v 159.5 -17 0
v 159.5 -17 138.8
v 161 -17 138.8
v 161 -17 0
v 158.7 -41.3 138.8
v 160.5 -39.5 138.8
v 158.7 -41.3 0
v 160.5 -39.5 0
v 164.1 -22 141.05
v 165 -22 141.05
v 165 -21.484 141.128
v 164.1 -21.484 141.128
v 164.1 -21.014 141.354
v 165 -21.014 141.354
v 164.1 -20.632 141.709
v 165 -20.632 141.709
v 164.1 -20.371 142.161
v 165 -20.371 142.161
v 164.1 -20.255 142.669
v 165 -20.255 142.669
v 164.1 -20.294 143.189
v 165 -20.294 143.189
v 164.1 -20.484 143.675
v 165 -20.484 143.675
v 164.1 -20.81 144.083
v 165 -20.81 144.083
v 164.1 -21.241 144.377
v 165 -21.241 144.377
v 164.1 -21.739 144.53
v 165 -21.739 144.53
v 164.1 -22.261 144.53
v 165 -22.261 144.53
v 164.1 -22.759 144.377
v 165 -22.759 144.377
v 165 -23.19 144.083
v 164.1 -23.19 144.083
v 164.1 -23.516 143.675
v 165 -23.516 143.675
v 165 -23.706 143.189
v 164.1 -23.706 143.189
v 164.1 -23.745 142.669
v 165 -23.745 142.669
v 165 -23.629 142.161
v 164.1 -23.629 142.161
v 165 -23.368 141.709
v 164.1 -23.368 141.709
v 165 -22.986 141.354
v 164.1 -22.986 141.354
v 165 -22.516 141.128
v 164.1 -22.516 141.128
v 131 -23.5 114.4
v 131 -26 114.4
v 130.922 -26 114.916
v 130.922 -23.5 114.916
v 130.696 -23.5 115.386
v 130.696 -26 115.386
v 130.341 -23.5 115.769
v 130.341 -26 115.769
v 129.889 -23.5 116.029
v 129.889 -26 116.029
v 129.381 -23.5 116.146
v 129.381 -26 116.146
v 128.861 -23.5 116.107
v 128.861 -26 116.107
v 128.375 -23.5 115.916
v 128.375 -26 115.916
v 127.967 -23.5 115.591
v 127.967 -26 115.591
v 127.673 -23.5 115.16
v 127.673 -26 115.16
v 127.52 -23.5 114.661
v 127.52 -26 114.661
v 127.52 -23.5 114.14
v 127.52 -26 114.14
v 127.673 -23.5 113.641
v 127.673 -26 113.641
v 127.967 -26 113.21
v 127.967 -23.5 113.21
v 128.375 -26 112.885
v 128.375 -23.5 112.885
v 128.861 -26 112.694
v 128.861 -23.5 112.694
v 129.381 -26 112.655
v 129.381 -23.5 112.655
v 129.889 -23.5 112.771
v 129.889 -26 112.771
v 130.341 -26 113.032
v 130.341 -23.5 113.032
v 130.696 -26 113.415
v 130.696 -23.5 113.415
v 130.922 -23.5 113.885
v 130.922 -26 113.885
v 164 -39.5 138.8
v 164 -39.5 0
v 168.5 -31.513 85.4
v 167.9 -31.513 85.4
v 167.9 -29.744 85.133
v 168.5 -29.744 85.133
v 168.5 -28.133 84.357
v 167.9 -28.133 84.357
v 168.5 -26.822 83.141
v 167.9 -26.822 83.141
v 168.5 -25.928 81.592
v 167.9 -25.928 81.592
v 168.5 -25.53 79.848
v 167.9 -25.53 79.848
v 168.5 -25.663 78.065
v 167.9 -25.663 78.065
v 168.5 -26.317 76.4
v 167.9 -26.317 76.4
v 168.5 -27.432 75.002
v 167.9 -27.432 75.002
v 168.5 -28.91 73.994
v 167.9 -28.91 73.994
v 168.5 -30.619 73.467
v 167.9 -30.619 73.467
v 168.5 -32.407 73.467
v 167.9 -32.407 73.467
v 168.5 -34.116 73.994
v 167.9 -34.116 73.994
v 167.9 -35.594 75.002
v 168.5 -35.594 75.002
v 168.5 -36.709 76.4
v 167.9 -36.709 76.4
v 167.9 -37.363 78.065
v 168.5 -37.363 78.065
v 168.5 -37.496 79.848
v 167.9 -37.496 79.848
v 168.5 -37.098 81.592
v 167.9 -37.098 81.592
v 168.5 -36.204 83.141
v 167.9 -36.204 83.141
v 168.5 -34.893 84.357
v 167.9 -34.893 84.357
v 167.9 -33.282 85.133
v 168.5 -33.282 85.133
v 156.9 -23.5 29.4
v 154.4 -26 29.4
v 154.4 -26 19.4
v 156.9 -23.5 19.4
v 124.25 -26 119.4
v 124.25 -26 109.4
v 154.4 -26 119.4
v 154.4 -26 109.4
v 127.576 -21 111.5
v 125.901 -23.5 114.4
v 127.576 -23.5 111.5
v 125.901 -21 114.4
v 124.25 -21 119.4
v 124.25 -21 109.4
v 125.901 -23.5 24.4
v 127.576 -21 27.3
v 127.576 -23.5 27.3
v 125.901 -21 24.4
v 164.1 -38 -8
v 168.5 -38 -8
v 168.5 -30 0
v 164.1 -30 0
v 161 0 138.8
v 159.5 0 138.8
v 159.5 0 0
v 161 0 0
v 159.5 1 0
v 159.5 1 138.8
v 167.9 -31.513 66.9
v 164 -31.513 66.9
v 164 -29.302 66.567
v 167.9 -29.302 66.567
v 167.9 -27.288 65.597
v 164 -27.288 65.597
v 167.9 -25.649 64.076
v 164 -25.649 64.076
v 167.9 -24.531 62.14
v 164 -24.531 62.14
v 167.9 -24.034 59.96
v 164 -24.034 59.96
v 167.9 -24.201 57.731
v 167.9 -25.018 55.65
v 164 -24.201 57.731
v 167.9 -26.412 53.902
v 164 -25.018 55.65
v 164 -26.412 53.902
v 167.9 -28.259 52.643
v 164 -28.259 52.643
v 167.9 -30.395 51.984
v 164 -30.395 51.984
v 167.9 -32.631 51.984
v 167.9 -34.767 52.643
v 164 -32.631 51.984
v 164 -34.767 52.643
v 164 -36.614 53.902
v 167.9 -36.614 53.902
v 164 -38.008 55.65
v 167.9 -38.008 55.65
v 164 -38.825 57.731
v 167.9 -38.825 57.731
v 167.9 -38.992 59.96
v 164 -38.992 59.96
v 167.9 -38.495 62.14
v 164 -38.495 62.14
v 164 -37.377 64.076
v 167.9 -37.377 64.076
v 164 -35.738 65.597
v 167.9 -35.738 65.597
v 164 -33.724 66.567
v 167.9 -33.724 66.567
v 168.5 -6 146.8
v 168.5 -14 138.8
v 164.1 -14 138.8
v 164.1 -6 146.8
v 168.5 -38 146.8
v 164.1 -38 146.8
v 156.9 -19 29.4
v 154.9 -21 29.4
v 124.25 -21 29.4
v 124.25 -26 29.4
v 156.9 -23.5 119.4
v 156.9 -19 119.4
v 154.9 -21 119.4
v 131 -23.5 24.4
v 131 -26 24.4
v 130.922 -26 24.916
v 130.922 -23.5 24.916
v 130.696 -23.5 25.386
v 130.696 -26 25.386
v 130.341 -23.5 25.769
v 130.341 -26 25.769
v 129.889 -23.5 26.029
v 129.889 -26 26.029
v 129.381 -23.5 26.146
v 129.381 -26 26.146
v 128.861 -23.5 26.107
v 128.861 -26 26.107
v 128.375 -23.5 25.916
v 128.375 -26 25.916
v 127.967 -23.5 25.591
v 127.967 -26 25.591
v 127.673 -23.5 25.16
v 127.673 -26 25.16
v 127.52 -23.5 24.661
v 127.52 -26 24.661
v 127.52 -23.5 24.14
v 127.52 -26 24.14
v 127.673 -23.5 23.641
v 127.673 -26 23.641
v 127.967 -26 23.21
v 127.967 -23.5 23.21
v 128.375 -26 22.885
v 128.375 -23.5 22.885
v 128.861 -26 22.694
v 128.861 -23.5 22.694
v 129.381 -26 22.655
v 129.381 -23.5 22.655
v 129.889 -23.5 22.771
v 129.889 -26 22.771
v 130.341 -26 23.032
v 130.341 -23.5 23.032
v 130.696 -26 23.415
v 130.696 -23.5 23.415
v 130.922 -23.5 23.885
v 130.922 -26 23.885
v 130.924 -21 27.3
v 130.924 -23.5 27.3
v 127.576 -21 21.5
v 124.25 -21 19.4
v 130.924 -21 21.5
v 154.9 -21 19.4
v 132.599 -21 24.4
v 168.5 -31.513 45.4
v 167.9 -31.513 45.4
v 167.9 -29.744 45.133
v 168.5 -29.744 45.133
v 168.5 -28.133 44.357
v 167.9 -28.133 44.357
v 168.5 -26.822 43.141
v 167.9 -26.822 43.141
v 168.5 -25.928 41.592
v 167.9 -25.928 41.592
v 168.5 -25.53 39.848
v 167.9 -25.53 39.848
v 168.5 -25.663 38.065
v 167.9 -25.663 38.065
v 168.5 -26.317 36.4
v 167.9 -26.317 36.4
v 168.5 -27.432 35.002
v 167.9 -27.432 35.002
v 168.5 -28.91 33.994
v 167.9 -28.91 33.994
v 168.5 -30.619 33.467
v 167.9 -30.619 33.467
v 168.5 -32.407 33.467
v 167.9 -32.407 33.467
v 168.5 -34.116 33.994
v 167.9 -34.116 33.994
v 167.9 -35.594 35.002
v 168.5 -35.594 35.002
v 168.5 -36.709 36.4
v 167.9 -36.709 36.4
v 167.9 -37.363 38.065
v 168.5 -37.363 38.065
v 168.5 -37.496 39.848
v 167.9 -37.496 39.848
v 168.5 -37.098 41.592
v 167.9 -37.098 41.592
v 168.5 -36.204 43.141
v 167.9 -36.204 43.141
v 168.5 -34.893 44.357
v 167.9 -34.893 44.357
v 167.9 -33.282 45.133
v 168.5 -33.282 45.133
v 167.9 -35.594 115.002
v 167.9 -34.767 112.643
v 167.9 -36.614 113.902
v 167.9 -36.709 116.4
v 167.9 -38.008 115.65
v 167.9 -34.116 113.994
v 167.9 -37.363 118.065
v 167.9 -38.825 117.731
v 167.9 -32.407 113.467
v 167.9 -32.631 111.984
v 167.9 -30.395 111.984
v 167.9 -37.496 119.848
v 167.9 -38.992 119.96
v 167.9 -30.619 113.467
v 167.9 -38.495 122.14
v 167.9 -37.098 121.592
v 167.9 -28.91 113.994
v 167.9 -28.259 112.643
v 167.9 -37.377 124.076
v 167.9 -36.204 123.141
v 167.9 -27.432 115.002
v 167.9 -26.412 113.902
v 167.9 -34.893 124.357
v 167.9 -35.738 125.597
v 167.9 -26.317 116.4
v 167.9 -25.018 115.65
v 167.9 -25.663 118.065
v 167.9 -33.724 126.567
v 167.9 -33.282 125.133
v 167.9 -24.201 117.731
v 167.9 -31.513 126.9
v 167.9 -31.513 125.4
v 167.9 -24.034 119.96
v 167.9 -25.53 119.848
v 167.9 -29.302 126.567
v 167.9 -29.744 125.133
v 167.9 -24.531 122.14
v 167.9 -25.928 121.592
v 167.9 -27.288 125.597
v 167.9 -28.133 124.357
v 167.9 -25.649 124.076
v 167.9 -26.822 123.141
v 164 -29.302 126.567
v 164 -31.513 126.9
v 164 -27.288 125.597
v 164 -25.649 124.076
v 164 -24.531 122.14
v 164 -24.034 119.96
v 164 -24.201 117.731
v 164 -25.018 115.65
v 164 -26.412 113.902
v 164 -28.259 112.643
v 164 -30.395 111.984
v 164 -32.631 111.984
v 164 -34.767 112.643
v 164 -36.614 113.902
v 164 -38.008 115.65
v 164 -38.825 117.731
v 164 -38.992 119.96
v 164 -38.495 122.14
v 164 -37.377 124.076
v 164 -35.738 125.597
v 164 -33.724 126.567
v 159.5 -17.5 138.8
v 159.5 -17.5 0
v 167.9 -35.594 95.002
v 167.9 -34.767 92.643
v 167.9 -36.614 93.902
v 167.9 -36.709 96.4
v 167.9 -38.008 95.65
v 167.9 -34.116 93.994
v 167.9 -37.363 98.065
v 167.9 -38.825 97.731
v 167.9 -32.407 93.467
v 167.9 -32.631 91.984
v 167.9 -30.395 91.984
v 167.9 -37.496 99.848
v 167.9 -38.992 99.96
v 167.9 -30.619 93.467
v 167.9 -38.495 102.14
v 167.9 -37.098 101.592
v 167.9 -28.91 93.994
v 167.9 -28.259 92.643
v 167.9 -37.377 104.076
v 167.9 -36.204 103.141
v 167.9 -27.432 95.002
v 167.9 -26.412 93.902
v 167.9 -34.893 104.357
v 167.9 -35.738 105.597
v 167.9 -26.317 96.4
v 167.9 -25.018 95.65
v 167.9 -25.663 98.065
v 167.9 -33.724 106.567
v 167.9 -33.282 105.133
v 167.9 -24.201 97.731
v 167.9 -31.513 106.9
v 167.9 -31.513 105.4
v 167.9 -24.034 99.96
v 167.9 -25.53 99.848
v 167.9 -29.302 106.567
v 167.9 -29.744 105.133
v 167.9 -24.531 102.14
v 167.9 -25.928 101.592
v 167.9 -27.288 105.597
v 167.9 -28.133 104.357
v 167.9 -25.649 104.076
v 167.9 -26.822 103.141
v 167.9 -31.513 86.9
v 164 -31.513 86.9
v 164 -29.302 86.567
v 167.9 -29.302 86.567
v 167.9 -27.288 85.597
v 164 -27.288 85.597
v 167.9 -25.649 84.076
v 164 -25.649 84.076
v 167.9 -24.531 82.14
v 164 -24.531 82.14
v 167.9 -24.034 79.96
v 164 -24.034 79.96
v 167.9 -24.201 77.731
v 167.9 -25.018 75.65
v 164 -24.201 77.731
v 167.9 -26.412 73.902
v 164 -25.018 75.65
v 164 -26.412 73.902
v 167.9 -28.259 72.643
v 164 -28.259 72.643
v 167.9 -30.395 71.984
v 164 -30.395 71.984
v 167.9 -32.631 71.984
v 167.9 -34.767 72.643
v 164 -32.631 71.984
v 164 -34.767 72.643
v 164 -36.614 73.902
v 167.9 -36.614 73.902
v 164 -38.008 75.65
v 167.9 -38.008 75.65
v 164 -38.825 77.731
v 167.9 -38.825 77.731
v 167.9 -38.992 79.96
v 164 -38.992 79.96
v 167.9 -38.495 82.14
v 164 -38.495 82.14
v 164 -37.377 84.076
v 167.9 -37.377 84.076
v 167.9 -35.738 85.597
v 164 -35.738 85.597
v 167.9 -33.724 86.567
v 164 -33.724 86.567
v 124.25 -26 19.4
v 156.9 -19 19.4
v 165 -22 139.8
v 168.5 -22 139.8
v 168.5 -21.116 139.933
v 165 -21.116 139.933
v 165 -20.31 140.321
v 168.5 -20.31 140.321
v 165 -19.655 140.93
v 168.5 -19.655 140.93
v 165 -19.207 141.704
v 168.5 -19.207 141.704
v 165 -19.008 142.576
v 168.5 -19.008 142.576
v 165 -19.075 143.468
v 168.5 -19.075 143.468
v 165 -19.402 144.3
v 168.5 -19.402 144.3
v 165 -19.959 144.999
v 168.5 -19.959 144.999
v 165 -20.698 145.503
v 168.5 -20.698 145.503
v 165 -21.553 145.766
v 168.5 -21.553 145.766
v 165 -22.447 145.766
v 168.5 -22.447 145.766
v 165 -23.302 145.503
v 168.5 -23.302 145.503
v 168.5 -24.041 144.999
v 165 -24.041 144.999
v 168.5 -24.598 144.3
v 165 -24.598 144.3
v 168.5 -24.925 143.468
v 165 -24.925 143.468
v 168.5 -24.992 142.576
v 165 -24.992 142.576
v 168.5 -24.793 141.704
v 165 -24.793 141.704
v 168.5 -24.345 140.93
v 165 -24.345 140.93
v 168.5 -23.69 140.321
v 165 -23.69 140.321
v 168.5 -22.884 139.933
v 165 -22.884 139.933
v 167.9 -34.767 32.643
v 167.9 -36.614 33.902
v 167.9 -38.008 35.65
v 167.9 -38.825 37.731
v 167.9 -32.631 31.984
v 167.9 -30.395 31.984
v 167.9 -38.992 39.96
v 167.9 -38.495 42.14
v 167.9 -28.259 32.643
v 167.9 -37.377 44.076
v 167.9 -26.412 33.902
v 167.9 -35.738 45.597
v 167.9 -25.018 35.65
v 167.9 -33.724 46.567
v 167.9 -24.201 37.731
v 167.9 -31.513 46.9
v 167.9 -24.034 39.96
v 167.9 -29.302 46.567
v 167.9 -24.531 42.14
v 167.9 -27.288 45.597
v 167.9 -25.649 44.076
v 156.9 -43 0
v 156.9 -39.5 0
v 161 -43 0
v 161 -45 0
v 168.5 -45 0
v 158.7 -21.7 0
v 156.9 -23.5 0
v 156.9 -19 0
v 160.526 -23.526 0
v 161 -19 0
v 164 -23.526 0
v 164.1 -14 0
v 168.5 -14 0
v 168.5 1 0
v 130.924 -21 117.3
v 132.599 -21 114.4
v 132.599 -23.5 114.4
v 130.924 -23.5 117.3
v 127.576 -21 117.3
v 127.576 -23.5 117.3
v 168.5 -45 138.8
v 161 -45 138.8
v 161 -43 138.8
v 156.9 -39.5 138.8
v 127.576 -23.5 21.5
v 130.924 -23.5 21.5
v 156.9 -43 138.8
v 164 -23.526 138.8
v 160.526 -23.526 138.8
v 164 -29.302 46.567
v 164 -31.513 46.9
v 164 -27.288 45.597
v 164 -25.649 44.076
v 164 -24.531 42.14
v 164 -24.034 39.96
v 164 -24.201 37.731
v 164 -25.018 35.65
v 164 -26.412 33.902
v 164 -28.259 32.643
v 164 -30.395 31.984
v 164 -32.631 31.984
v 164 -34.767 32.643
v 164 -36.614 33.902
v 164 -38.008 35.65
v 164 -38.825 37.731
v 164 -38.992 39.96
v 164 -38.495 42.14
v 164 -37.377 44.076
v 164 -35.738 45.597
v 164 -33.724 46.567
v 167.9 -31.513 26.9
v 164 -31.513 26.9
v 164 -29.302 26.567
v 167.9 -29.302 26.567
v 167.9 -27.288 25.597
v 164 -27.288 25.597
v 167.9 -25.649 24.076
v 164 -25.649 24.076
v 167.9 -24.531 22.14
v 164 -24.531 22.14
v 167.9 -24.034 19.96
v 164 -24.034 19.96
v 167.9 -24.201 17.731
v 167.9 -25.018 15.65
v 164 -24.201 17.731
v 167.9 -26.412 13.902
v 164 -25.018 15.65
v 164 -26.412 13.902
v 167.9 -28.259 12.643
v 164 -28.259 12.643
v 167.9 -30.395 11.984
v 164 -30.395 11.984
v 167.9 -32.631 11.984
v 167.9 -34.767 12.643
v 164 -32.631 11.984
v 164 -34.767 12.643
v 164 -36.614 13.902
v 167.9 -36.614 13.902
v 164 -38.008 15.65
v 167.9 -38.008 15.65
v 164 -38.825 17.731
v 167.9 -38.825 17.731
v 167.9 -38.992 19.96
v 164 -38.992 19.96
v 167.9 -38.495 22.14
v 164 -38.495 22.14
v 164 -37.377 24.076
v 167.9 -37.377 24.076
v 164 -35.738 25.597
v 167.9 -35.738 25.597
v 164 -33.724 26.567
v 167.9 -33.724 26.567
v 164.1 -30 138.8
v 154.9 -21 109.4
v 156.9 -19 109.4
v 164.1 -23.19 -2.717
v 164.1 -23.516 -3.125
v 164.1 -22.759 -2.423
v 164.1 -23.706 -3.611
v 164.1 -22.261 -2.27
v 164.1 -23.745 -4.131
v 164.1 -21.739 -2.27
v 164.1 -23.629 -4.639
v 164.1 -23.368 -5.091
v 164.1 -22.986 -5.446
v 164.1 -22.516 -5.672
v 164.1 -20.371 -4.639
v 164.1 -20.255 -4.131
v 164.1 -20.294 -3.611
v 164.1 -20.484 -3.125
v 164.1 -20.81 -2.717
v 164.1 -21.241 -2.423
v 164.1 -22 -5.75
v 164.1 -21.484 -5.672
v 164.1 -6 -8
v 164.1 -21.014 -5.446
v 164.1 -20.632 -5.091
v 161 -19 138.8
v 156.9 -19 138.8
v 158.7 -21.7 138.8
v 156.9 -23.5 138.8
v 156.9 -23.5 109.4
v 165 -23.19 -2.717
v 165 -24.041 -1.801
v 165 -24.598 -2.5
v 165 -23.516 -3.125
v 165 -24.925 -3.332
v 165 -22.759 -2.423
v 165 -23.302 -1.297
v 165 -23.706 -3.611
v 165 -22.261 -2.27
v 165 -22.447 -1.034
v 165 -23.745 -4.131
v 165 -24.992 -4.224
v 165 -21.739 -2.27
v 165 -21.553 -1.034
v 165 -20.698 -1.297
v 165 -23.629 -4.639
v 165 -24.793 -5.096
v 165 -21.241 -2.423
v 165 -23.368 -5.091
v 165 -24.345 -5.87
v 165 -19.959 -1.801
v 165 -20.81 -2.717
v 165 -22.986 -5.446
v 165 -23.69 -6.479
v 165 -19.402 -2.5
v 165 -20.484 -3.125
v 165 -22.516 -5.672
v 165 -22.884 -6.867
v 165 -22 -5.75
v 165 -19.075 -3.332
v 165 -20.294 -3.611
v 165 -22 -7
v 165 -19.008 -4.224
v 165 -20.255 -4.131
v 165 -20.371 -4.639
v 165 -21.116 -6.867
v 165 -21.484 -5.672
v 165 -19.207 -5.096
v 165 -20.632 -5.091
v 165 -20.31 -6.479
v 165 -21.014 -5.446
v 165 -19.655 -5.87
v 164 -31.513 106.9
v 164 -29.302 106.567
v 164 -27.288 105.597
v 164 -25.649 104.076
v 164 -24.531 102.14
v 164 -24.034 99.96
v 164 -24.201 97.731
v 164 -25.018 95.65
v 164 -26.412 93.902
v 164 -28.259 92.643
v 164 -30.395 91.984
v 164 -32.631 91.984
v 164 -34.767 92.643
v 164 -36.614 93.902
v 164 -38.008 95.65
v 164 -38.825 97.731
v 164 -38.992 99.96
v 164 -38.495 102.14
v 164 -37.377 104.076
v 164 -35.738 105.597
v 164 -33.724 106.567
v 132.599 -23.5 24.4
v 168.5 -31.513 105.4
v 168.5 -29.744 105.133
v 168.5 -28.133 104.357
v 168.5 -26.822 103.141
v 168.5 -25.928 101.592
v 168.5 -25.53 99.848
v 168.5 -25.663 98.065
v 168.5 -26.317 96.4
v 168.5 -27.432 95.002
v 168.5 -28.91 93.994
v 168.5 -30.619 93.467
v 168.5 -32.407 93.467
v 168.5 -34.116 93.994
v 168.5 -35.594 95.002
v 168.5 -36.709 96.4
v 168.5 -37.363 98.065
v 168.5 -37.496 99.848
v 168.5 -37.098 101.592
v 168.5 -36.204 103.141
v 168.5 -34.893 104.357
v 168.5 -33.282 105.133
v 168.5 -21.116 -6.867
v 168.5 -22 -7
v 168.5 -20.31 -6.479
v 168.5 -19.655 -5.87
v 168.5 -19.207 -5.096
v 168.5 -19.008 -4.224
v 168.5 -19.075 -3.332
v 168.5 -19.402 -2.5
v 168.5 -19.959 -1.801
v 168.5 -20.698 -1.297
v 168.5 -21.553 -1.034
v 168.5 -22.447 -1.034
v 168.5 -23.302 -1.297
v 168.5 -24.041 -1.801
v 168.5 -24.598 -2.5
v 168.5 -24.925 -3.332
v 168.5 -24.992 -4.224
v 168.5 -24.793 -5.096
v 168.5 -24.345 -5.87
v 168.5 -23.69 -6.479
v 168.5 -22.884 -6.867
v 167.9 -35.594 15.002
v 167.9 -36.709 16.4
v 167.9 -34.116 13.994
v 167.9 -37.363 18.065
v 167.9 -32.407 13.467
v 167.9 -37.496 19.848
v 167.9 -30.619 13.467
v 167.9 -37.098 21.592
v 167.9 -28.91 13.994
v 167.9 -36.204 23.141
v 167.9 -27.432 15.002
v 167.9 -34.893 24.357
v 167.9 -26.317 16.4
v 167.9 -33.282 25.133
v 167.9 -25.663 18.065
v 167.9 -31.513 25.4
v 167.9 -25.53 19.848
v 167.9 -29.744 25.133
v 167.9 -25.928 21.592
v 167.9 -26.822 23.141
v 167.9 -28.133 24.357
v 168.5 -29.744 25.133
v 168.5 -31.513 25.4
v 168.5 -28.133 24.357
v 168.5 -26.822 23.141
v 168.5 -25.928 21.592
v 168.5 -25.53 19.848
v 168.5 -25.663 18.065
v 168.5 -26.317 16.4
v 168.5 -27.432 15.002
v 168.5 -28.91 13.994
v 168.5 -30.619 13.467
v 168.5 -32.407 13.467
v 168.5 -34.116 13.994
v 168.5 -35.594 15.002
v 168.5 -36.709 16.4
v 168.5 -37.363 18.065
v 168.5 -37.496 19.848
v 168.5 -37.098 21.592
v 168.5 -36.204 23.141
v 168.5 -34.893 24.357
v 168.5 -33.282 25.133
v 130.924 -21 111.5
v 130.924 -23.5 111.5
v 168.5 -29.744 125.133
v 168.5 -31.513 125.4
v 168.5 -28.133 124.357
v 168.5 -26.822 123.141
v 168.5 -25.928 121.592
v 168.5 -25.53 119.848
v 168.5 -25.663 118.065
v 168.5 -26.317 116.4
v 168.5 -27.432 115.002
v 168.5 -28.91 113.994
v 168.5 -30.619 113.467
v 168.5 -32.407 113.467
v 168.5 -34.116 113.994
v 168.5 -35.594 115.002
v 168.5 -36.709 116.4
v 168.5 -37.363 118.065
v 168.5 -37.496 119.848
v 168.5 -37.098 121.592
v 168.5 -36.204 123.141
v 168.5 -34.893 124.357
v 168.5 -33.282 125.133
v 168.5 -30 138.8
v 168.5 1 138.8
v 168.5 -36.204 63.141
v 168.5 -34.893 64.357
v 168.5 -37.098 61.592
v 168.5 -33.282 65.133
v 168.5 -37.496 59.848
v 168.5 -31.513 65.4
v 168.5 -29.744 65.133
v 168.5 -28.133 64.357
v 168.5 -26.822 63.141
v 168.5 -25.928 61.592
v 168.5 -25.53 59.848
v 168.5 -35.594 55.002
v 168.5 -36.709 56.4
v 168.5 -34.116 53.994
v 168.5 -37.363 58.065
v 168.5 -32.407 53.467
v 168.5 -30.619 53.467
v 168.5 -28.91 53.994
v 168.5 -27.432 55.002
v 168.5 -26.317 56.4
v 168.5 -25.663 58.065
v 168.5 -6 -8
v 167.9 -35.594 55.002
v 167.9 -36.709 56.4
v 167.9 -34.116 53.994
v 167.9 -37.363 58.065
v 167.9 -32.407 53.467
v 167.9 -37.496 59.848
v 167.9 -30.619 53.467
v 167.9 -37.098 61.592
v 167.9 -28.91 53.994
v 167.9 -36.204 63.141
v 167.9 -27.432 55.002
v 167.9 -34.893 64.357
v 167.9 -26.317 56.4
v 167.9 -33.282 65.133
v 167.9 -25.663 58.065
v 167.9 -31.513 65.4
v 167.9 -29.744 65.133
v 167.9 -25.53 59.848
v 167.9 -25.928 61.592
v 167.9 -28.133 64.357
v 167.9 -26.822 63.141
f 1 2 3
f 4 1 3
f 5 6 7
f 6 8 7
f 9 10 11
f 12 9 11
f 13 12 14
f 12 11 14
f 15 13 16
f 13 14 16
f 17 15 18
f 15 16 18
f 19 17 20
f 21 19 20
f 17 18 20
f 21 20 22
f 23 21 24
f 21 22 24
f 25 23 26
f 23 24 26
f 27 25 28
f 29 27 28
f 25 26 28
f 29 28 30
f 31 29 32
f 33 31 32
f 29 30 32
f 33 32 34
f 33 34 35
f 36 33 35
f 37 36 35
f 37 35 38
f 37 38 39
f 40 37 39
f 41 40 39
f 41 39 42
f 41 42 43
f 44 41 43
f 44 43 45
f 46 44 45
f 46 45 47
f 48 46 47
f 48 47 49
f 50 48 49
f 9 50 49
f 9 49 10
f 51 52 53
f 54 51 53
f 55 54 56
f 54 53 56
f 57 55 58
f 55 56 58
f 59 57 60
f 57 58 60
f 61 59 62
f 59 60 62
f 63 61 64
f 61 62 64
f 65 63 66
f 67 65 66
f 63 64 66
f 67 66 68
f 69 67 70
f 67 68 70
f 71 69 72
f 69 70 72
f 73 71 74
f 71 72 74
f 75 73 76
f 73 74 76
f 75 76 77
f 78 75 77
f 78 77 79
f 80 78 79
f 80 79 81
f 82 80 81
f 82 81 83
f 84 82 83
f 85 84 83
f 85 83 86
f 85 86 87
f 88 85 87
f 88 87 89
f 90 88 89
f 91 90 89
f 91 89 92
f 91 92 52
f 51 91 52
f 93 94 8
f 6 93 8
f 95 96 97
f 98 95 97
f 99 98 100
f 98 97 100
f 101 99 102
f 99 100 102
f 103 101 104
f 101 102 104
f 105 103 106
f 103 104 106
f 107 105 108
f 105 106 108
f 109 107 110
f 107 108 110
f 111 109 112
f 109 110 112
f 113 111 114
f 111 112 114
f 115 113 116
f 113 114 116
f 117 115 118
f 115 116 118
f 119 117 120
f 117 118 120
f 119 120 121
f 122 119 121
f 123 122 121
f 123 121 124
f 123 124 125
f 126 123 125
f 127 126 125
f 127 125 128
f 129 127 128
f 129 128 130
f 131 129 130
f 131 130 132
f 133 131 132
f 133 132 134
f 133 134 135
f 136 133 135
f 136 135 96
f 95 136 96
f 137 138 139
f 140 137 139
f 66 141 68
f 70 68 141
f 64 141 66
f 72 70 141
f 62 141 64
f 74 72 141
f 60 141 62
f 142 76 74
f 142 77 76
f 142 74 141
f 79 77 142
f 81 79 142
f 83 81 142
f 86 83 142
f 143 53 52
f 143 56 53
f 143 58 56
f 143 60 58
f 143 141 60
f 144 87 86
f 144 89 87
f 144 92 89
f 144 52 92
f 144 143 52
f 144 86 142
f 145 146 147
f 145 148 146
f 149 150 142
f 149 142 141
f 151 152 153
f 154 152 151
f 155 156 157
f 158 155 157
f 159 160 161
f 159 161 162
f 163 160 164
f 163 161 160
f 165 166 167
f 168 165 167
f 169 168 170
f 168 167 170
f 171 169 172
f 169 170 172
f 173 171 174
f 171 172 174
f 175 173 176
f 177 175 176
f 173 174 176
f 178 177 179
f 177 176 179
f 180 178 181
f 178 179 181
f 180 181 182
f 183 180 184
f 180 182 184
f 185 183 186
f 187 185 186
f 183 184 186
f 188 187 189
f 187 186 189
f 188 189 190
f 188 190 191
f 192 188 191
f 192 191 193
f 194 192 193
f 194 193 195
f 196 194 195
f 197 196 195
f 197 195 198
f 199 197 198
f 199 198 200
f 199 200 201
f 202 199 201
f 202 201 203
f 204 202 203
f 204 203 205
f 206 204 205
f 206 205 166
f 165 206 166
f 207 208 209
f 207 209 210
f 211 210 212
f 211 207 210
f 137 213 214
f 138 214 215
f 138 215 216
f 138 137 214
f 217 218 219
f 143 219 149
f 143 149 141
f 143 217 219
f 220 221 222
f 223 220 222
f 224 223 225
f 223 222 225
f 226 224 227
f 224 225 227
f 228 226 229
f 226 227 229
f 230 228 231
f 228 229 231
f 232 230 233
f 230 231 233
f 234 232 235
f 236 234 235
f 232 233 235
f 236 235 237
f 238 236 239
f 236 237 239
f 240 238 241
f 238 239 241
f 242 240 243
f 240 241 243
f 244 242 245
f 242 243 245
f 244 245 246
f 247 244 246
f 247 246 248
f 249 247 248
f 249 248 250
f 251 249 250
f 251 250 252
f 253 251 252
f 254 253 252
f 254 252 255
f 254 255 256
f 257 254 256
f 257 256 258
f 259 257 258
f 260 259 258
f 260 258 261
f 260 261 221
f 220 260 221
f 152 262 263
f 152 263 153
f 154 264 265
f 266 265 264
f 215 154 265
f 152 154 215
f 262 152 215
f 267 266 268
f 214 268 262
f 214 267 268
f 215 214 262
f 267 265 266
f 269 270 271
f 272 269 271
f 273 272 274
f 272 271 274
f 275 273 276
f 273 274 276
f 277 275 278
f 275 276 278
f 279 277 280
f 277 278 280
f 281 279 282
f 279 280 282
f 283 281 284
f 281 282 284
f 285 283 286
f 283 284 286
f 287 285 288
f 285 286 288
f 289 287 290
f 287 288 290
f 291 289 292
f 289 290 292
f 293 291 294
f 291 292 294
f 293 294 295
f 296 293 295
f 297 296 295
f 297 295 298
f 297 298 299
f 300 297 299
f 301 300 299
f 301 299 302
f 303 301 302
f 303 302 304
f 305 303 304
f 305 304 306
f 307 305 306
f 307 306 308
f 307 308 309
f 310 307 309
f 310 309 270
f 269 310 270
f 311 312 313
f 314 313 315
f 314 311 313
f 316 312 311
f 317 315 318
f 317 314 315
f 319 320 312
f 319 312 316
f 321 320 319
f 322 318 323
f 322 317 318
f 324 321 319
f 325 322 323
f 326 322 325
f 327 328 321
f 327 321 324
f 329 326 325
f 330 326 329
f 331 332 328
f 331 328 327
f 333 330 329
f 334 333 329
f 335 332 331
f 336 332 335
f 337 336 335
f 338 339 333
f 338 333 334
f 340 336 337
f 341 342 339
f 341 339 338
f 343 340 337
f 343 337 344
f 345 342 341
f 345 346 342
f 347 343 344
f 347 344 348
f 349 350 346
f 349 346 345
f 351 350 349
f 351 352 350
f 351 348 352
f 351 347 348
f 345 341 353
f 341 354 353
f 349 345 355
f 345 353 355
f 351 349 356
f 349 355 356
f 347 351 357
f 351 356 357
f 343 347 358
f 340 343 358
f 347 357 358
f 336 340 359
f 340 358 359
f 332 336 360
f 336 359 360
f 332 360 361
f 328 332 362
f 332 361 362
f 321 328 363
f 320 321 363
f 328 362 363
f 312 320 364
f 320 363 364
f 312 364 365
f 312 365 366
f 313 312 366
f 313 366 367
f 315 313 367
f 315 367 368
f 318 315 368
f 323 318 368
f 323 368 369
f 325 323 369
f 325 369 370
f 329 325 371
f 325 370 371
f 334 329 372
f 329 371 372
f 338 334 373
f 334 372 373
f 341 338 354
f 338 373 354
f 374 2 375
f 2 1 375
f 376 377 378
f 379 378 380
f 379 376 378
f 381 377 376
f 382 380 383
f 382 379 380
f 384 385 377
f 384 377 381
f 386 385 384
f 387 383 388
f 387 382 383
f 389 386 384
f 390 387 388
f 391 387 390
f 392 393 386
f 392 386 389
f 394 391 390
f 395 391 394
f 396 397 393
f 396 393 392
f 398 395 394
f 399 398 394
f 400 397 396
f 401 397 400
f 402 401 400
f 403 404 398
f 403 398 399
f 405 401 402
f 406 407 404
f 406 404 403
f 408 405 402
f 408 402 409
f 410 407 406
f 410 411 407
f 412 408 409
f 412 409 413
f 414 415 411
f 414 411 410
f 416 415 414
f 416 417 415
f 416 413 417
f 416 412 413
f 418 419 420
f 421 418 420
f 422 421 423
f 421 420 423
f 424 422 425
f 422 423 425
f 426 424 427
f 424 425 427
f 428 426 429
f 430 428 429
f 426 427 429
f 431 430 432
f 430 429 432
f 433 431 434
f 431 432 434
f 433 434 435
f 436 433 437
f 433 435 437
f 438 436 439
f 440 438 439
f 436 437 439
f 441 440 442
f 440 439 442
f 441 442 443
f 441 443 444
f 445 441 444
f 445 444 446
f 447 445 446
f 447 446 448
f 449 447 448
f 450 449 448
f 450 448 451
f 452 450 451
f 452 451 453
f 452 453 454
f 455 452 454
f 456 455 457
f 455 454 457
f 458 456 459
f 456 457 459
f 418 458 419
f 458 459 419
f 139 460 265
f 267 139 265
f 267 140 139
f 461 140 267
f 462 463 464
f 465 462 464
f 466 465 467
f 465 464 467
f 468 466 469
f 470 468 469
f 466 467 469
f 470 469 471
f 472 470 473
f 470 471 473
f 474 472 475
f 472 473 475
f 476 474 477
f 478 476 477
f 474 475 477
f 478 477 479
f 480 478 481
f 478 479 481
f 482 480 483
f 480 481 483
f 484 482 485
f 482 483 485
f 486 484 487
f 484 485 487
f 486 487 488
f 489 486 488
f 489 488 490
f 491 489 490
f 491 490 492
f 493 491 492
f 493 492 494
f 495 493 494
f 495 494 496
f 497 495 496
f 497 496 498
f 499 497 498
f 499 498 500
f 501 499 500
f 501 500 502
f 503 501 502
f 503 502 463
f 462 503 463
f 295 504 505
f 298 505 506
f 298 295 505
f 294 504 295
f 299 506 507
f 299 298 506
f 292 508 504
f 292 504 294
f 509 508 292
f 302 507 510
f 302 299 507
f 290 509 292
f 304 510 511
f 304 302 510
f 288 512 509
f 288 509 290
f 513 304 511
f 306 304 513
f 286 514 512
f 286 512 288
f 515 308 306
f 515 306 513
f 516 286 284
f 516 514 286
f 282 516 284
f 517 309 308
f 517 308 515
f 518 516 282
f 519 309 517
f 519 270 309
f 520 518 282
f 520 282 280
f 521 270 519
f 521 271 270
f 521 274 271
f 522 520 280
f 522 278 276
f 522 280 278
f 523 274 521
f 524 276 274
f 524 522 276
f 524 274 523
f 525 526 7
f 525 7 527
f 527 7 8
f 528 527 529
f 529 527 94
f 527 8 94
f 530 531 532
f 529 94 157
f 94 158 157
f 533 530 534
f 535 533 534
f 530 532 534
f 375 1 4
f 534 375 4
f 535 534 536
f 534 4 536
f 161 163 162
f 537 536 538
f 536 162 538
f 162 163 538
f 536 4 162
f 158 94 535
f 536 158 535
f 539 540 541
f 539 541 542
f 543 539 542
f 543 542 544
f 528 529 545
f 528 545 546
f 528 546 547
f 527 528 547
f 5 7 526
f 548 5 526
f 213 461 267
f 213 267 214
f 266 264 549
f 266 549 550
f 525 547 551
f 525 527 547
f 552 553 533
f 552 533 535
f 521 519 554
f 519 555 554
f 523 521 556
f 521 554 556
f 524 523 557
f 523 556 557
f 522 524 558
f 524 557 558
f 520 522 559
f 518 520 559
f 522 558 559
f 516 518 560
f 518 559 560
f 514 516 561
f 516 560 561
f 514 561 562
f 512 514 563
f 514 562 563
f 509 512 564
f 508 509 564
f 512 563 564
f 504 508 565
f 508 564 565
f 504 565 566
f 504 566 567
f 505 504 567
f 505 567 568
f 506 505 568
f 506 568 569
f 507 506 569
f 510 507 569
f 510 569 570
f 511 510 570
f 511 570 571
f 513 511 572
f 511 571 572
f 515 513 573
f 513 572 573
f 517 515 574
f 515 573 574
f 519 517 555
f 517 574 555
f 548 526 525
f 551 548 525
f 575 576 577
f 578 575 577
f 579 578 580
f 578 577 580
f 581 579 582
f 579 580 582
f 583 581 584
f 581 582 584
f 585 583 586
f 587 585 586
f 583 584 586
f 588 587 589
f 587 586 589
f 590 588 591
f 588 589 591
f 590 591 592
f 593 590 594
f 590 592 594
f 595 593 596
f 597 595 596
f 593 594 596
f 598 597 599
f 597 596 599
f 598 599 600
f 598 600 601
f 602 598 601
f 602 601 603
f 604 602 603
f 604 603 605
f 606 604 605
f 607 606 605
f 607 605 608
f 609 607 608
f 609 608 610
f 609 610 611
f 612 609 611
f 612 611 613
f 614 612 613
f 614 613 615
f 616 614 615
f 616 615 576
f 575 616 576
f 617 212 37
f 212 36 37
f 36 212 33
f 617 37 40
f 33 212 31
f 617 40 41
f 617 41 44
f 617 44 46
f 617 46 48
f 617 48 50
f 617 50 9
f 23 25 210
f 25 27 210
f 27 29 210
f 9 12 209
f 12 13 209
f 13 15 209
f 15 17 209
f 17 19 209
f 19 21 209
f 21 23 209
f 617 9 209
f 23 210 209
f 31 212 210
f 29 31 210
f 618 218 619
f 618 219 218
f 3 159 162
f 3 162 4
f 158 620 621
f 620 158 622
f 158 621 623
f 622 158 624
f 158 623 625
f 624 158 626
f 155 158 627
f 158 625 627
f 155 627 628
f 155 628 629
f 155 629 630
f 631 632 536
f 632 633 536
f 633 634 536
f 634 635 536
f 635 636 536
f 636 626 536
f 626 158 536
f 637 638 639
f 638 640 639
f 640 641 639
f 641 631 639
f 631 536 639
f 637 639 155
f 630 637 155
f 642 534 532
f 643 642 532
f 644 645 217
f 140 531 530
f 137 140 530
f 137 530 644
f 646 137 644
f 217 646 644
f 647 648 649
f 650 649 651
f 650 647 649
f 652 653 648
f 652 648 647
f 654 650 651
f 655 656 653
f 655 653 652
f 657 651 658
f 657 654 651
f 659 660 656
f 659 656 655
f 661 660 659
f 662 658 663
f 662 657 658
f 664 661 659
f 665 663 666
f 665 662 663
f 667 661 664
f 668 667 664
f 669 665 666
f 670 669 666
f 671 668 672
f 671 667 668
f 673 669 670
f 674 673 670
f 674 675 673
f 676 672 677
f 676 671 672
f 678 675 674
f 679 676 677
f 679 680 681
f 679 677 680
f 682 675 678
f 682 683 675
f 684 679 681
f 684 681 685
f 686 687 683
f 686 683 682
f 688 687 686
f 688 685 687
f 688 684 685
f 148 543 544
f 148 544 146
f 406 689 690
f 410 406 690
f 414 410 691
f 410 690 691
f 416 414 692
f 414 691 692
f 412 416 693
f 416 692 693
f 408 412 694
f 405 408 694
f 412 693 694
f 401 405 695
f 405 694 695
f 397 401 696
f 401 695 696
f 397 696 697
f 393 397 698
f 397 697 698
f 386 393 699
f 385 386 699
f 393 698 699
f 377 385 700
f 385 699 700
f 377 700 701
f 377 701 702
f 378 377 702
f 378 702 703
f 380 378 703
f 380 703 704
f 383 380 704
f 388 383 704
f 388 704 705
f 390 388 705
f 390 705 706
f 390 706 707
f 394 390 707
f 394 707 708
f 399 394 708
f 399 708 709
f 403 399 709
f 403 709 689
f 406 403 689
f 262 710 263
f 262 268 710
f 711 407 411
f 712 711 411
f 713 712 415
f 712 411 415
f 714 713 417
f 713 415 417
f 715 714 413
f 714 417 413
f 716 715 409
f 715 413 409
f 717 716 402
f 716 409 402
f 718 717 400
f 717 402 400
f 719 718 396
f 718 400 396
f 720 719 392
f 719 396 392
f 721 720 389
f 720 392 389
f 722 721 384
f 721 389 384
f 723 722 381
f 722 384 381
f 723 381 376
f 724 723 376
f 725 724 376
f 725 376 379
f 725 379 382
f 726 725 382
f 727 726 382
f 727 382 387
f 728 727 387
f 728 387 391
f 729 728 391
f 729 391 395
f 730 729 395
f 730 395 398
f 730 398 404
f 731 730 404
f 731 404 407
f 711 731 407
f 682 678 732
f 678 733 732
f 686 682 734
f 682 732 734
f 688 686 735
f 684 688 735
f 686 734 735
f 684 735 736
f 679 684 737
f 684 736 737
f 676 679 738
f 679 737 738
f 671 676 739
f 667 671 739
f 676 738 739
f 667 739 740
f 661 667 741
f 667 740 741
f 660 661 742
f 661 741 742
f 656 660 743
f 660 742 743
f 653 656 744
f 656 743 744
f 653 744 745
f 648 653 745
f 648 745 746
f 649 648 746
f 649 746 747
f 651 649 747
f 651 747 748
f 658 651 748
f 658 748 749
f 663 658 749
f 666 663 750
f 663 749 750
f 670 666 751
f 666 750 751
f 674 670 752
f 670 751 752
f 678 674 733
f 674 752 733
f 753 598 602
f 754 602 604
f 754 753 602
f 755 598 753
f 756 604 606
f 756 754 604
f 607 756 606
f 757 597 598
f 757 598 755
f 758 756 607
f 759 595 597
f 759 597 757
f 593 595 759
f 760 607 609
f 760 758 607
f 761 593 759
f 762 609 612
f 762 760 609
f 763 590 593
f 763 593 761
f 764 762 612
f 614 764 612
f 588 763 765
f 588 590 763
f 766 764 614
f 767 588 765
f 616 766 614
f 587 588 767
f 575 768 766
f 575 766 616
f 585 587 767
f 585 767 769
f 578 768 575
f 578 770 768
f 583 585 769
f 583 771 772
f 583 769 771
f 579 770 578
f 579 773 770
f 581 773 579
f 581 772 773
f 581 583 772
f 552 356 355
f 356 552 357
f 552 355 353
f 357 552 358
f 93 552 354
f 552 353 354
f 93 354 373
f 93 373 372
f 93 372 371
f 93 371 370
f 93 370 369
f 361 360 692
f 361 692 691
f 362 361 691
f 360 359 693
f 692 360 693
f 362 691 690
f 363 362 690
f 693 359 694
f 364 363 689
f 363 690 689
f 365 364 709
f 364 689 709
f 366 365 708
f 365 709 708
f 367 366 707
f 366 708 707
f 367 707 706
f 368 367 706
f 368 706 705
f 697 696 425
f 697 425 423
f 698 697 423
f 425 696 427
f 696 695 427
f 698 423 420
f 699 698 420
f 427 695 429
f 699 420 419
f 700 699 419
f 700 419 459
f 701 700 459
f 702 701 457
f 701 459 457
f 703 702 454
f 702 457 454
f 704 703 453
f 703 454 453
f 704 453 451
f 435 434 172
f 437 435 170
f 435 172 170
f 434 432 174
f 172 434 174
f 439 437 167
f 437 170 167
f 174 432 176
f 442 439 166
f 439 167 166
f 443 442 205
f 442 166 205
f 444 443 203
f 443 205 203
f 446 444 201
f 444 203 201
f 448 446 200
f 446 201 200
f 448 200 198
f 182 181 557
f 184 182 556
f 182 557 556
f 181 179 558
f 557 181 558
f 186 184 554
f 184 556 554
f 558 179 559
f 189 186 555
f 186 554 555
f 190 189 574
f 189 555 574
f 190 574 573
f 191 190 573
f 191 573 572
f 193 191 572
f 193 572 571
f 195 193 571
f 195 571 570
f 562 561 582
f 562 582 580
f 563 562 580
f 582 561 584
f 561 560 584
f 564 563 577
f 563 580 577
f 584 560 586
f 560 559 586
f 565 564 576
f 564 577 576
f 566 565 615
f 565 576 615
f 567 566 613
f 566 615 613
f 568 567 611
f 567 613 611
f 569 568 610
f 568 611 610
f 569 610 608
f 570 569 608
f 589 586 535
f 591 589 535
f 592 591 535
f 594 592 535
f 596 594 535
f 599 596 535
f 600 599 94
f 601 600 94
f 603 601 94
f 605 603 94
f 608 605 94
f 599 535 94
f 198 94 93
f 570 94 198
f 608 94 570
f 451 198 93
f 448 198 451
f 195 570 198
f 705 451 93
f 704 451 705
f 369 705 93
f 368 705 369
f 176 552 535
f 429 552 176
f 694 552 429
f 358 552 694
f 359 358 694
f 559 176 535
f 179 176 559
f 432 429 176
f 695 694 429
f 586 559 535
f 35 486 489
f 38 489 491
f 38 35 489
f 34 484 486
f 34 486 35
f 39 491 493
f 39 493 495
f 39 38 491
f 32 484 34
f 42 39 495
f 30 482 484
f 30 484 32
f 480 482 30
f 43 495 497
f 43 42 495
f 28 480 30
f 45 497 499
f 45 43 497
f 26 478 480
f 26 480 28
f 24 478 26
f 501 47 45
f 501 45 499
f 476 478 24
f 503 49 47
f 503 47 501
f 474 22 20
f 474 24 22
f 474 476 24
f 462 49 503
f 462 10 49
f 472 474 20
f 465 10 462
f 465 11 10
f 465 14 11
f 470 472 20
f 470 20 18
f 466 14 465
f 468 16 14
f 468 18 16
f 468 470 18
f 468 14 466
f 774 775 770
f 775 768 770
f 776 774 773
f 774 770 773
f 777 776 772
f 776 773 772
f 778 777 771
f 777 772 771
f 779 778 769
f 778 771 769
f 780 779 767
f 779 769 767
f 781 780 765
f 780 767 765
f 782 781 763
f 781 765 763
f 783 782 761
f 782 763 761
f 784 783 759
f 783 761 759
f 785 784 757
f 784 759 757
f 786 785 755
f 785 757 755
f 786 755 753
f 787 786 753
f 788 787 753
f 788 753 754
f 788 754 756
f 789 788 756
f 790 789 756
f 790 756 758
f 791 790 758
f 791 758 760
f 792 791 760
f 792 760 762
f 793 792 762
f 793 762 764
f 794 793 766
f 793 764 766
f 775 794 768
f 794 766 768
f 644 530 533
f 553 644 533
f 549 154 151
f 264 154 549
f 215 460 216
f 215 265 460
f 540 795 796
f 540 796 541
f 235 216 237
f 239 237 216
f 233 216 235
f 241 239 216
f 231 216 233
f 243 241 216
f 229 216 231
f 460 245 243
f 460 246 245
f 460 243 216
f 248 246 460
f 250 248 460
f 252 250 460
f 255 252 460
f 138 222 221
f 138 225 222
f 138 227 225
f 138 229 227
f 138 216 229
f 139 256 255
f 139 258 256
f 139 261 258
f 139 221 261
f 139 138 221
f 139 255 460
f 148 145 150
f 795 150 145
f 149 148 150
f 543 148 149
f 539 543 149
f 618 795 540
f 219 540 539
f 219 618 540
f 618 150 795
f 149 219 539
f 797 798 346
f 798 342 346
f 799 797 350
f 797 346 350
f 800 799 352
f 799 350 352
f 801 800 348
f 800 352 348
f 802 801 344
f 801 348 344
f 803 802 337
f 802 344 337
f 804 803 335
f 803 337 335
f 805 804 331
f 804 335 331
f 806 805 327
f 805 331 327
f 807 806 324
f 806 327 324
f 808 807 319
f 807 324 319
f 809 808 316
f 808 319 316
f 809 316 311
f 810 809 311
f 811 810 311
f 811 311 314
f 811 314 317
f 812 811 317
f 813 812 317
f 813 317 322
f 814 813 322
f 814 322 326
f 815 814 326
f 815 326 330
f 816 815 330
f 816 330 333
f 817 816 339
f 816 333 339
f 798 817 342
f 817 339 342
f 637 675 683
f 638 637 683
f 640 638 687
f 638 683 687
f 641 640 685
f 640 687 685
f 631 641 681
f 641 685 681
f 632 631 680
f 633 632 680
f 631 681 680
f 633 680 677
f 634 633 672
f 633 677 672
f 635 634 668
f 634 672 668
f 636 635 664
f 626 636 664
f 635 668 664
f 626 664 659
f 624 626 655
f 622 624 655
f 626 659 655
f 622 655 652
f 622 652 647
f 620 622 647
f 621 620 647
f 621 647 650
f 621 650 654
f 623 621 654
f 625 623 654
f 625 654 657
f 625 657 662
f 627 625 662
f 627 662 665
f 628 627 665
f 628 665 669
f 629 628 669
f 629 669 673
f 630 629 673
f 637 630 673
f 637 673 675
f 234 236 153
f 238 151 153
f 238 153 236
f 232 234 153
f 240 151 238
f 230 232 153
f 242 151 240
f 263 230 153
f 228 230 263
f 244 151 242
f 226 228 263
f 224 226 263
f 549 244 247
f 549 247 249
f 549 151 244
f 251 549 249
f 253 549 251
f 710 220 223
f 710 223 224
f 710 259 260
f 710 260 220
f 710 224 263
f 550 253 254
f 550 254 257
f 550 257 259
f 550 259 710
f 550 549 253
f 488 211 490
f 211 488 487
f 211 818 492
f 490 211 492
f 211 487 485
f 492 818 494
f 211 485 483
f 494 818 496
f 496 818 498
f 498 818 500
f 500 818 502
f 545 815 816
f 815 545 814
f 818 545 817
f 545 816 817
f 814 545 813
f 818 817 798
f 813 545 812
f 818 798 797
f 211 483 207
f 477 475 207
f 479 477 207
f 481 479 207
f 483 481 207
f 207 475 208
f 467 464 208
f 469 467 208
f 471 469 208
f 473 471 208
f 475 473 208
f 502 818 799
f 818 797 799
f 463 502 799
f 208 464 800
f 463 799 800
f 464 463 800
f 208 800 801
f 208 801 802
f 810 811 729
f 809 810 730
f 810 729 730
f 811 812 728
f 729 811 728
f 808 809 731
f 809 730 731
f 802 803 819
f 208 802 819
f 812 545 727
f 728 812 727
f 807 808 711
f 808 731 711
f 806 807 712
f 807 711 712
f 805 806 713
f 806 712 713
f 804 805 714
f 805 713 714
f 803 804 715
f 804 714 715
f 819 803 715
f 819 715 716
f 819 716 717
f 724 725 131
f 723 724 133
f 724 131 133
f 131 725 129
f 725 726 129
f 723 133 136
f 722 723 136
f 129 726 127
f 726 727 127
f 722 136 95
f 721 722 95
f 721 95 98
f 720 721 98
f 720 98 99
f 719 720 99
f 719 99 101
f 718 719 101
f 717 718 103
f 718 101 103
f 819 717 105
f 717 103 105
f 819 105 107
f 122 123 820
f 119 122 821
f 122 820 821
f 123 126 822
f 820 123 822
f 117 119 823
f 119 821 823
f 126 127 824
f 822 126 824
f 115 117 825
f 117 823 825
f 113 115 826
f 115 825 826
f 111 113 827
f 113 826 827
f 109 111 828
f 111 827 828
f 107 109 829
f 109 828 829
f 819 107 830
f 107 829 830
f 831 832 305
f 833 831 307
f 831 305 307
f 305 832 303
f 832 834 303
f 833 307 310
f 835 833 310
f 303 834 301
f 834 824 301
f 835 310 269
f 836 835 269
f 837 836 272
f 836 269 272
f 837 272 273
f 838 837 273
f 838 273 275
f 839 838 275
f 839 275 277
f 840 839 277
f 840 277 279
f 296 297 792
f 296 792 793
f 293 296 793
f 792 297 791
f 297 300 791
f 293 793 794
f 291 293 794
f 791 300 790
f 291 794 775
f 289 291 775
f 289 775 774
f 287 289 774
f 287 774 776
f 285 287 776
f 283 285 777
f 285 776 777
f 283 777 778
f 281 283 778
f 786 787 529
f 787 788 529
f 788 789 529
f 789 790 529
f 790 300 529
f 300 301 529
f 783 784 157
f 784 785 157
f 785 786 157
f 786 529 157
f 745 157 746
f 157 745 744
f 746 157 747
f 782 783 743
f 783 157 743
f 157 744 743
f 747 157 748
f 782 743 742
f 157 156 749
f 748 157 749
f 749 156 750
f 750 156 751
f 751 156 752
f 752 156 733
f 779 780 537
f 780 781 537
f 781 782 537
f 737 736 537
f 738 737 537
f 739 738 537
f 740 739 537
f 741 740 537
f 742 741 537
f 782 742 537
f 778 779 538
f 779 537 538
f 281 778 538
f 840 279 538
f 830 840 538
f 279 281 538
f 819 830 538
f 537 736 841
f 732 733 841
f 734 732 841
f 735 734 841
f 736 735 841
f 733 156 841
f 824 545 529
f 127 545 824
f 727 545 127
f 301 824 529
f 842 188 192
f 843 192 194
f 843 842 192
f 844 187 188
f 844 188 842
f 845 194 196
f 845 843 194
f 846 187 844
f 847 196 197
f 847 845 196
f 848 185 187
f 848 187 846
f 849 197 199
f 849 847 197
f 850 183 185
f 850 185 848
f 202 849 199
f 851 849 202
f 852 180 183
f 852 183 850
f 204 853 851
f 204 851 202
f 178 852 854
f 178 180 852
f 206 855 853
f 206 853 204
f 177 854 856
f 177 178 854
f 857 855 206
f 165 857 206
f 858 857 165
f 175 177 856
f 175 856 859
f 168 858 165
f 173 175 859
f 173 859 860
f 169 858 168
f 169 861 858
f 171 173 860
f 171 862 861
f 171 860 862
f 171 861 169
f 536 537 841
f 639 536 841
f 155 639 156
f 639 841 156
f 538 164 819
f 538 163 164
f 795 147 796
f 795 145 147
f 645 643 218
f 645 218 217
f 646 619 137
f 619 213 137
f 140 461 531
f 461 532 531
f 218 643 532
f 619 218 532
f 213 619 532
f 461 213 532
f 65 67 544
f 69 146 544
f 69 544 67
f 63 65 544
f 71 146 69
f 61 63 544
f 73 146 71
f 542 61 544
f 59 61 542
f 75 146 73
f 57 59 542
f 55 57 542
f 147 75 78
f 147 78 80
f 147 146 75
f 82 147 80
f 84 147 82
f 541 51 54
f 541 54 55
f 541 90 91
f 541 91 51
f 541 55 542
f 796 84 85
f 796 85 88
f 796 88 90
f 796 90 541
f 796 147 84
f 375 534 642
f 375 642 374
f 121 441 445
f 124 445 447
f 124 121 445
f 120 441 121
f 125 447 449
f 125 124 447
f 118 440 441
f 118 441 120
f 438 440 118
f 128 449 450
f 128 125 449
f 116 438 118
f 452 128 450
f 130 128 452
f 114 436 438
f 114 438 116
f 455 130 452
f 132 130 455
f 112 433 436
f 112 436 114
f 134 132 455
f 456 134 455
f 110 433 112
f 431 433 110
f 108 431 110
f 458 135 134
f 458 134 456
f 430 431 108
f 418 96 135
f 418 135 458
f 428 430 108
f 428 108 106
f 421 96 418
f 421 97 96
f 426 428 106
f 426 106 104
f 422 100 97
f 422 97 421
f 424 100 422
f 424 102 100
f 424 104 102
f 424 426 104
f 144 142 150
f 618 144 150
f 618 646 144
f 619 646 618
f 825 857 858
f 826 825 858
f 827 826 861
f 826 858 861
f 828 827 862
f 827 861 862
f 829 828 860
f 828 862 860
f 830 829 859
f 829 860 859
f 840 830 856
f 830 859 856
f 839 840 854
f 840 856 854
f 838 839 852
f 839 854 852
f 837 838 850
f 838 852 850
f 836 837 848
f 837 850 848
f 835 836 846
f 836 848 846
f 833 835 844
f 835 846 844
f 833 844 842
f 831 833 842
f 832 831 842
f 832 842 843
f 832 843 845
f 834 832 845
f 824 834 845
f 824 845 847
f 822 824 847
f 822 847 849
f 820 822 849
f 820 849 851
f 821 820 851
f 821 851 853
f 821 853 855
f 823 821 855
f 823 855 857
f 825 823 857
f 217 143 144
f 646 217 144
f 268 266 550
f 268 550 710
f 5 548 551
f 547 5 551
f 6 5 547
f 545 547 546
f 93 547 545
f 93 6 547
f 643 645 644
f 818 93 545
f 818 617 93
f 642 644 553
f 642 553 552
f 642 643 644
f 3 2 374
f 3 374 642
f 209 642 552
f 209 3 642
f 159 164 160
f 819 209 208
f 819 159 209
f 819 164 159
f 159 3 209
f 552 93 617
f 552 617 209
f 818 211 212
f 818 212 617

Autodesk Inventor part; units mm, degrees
ref_plane "YZ Plane" through (0, 0, 0) normal (1, 0, 0) x (0, 1, 0)
ref_plane "XZ Plane" through (0, 0, 0) normal (0, 1, 0) x (-1, 0, 0)
ref_plane "XY Plane" through (0, 0, 0) normal (0, 0, 1) x (1, 0, 0)
ref_plane "Arbeitsebene1" through (0, 0, 0) normal (0, 0, 1) x (1, 0, 0)
sketch "Skizze1" plane through (0, 0, 0) normal (0, 0, 1) x (1, 0, 0)
  line L0 (159.5, 1) -> (168.5, 1) projected
  line L1 (159.5, 0) -> (159.5, 1) projected
  line L2 (161, 0) -> (161, -17) projected
  line L3 (159.5, 0) -> (161, 0) projected
  line L4 (168.5, -14) -> (168.5, 1) projected
  line L5 (159.5, -17) -> (161, -17) projected
  line L6 (159.5, -17) -> (159.5, -17.5) projected
  line L7 (161, -19) -> (159.5, -17.5) projected
  line L8 (168.5, -6) -> (168.5, -38) projected
  line L9 (168.5, -45) -> (168.5, -30) projected
  line L10 (168.5, -45) -> (161, -45) projected
  line L11 (159.5, -22.5) -> (157.9, -22.5) construction
  line L12 (157.9, -22.5) -> (157.9, -40.5) construction
  line L13 (157.9, -40.5) -> (159.5, -40.5) construction
  line L14 (159.5, -40.5) -> (159.5, -22.5) construction
  line L15 (167.9, -24) -> (164, -24) construction
  line L16 (164, -24) -> (164, -39) construction
  line L17 (164, -39) -> (167.9, -39) construction
  line L18 (167.9, -39) -> (167.9, -24) construction
  line L19 (167.9, -25.5) -> (168.5, -25.5) construction
  line L20 (168.5, -25.5) -> (168.5, -37.5) construction
  line L21 (168.5, -37.5) -> (167.9, -37.5) construction
  line L22 (167.9, -37.5) -> (167.9, -25.5) construction
  line L23 (164, -31.5) -> (167.9, -31.5) construction
  line L24 (168.5, -31.5) -> (167.9, -31.5) construction
  line L25 (164, -31.5) -> (159.5, -31.5) construction
  line L26 (159.5, -22.5) -> (160.5261, -23.5261) construction
  line L27 (159.5, -22.5) -> (160.9511, -22.5) construction
  line L28 (164, -31.5) -> (167.9, -31.5) construction
  line L29 (159.5, -22.5) -> (158.7, -21.7) construction
  line L30 (158.7, -21.7) -> (156.9, -23.5) construction
  line L31 (156.9, -23.5) -> (156.9, -19) construction
  line L32 (156.9, -19) -> (161, -19) construction
  line L33 (157.9, -40.5) -> (156.9, -39.5) construction
  line L34 (158.7, -41.3) -> (160.5, -39.5) construction
  line L35 (160.5, -39.5) -> (164, -39.5) construction
  line L36 (164, -39.5) -> (164, -39) construction
  line L37 (160.5261, -23.5261) -> (164, -23.5261) construction
  line L38 (164, -23.5261) -> (164, -24) construction
  line L39 (157.9, -40.5) -> (158.7, -41.3) construction
  line L40 (156.9, -39.5) -> (156.9, -43) construction
  line L41 (161, -45) -> (161, -43)
  line L42 (161, -43) -> (156.9, -43)
  line L43 (161, -19) -> (156.9, -19)
  line L44 (156.9, -19) -> (156.9, -23.5)
  line L45 (156.9, -23.5) -> (158.7, -21.7)
  line L46 (158.7, -21.7) -> (160.5261, -23.5261)
  line L47 (160.5261, -23.5261) -> (164, -23.5261)
  line L48 (164, -23.5261) -> (164, -24)
  line L49 (164, -24) -> (164, -39.5)
  line L50 (164, -39.5) -> (160.5, -39.5)
  line L51 (160.5, -39.5) -> (158.7, -41.3)
  line L52 (158.7, -41.3) -> (156.9, -39.5)
  line L53 (156.9, -39.5) -> (156.9, -43)
  point P0 (0, 0)
  dimension "d0" = 0.6
  dimension "d2" = 6.1
  dimension "d4" = 12
  dimension "d5" = 15
  dimension "d6" = 1.6
  dimension "d7" = 4.5
  dimension "d8" = 18
  dimension "d9" = 45
  dimension "d10" = 1.0261
  dimension "d11" = 6
  dimension "d12" = 1
  dimension "d13" = 0.8
  dimension "d14" = 0.8
  dimension "d15" = 1
  dimension "d16" = 1
  dimension "d17" = 0.8
  dimension "d18" = 1
  dimension "d19" = 2
  dimension "d69" = 3.9
extrude "Extrusion1" add sketch "Skizze1" along normal blind 138.8
sketch "Skizze2" plane through (168.5, -45, 0) normal (1, 0, 0) x (0, 0, -1)
  line L0 (0, 46) -> (-138.8, 46) construction
  line L1 (-69.4, 46) -> (-69.4, 0) construction
  circle A0 centre (4, 23) radius 1.75 projected
  line L2 (0, 15) -> (0, 31) projected
  line L3 (8, 7) -> (0, 15) projected
  line L4 (8, 39) -> (8, 7) projected
  line L5 (0, 31) -> (8, 39) projected
  circle A1 centre (-142.8, 23) radius 1.75
  line L6 (-138.8, 15) -> (-138.8, 31)
  line L7 (-146.8, 7) -> (-138.8, 15)
  line L8 (-146.8, 39) -> (-146.8, 7)
  line L9 (-138.8, 31) -> (-146.8, 39)
  point P0 (0, 45)
extrude "Extrusion2" add sketch "Skizze2" against normal blind 4.4
sketch "Skizze3" plane through (168.5, 1, 138.8) normal (1, 0, 0) x (0, 0, -1)
  circle A0 centre (142.8, -23) radius 1.75 projected
  circle A1 centre (-4, -23) radius 1.75 projected
  circle A2 centre (142.8, -23) radius 3
  circle A3 centre (-4, -23) radius 3
  point P0 (138.8, -1)
  dimension "d24" = 6
  dimension "d25" = 6
extrude "Extrusion3" cut sketch "Skizze3" against normal blind 3.5
sketch "Skizze4" plane through (156.9, -23.5, 0) normal (-1, 0, 0) x (0, 0, 1)
  line L0 (109.4004, 2.5) -> (119.4004, 2.5) projected
  line L1 (119.4004, 2.5) -> (119.4004, -2.5) projected
  line L2 (119.4004, -2.5) -> (109.4004, -2.5) projected
  line L3 (109.4004, -2.5) -> (109.4004, 2.5) projected
  line L4 (19.4004, 2.5) -> (29.4004, 2.5) projected
  line L5 (29.4004, 2.5) -> (29.4004, -2.5) projected
  line L6 (29.4004, -2.5) -> (19.4004, -2.5) projected
  line L7 (19.4004, -2.5) -> (19.4004, 2.5) projected
  point P0 (0, 23.5)
extrude "Extrusion4" add sketch "Skizze4" along normal blind 32.65
chamfer "Fase1" distance 2.5 angle 45 2 edges at (156.9, -26, 114.4004) (156.9, -26, 24.4004)
sketch "Skizze5" plane through (124.25, -26, 29.4004) normal (0, -1, 0) x (1, 0, 0)
  circle A0 centre (5, -5) radius 1.75
  circle A1 centre (5, 85) radius 1.75
  line L0 (32.65, 0) -> (0, 0) projected
  line L1 (0, -10) -> (0, 0) projected
  line L2 (0, 80) -> (0, 90) projected
  line L3 (32.65, 90) -> (0, 90) projected
  point P0 (-124.25, -29.4004)
  dimension "d33" = 3.5
  dimension "d34" = 3.5
  dimension "d35" = 5
  dimension "d36" = 5
  dimension "d37" = 5
  dimension "d38" = 5
extrude "Extrusion5" cut sketch "Skizze5" against normal blind 36.75
sketch "Skizze7" plane through (156.9, -21, 119.4004) normal (0, 1, 0) x (1, 0, 0)
  circle A0 centre (-27.65, 5) radius 1.75 construction
  circle A1 centre (-27.65, 95) radius 1.75 construction
  line L0 (-29.3243, 7.9) -> (-25.9757, 7.9)
  line L1 (-25.9757, 7.9) -> (-24.3014, 5)
  line L2 (-24.3014, 5) -> (-25.9757, 2.1)
  line L3 (-25.9757, 2.1) -> (-29.3243, 2.1)
  line L4 (-29.3243, 2.1) -> (-30.9986, 5)
  line L5 (-30.9986, 5) -> (-29.3243, 7.9)
  line L6 (-29.3243, 97.9) -> (-25.9757, 97.9)
  line L7 (-25.9757, 97.9) -> (-24.3014, 95)
  line L8 (-24.3014, 95) -> (-25.9757, 92.1)
  line L9 (-25.9757, 92.1) -> (-29.3243, 92.1)
  line L10 (-29.3243, 92.1) -> (-30.9986, 95)
  line L11 (-30.9986, 95) -> (-29.3243, 97.9)
  point P0 (-156.9, 119.4004)
  dimension "d41" = 5.8
  dimension "d43" = 5.8
extrude "Extrusion6" cut sketch "Skizze7" against normal blind 2.5
chamfer "Fase2" distance 2 angle 45 2 edges at (156.9, -21, 114.4004) (156.9, -21, 24.4004)
sketch "Skizze8" plane through (164, -39.5, 0) normal (-1, 0, 0) x (0, 0, 1)
  line L0 (0, 9.5) -> (0, -5.5) construction
  line L1 (0, 0) -> (0, 15.9739) construction
  line L2 (0, 7.987) -> (138.8, 7.987) construction
  line L3 (138.8, -5.5) -> (138.8, 9.5) construction
  circle A0 centre (19.4, 7.987) radius 7.5
  circle A1 centre (39.4, 7.987) radius 7.5
  circle A2 centre (59.4, 7.987) radius 7.5
  circle A3 centre (79.4, 7.987) radius 7.5
  circle A4 centre (99.4, 7.987) radius 7.5
  circle A5 centre (119.4, 7.987) radius 7.5
  point P0 (0, 39.5)
  dimension "d49" = 15
  dimension "d50" = 19.4
  dimension "d53" = 20
  dimension "d58" = 19.4
extrude "Extrusion7" cut sketch "Skizze8" against normal blind 3.9
sketch "Skizze9" plane through (167.9, -31.513, 19.4) normal (-1, 0, 0) x (0, 0, 1)
  circle A0 centre (0, 0) radius 7.5 projected
  circle A1 centre (20, 0) radius 7.5 projected
  circle A2 centre (40, 0) radius 7.5 projected
  circle A3 centre (60, 0) radius 7.5 projected
  circle A4 centre (80, 0) radius 7.5 projected
  circle A5 centre (100, 0) radius 7.5 projected
  circle A6 centre (0, 0) radius 6
  circle A7 centre (20, 0) radius 6
  circle A8 centre (40, 0) radius 6
  circle A9 centre (60, 0) radius 6
  circle A10 centre (80, 0) radius 6
  circle A11 centre (100, 0) radius 6
  point P0 (-19.4, 31.513)
  dimension "d61" = 12
  dimension "d62" = 12
  dimension "d63" = 12
  dimension "d64" = 12
  dimension "d65" = 12
  dimension "d66" = 12
extrude "Extrusion8" cut sketch "Skizze9" against normal blind 3.9 contours A6 | A7 | A8 | A9 | A10 | A11
equation "\"d25\" = d24"
properties part number "TopFrame"
